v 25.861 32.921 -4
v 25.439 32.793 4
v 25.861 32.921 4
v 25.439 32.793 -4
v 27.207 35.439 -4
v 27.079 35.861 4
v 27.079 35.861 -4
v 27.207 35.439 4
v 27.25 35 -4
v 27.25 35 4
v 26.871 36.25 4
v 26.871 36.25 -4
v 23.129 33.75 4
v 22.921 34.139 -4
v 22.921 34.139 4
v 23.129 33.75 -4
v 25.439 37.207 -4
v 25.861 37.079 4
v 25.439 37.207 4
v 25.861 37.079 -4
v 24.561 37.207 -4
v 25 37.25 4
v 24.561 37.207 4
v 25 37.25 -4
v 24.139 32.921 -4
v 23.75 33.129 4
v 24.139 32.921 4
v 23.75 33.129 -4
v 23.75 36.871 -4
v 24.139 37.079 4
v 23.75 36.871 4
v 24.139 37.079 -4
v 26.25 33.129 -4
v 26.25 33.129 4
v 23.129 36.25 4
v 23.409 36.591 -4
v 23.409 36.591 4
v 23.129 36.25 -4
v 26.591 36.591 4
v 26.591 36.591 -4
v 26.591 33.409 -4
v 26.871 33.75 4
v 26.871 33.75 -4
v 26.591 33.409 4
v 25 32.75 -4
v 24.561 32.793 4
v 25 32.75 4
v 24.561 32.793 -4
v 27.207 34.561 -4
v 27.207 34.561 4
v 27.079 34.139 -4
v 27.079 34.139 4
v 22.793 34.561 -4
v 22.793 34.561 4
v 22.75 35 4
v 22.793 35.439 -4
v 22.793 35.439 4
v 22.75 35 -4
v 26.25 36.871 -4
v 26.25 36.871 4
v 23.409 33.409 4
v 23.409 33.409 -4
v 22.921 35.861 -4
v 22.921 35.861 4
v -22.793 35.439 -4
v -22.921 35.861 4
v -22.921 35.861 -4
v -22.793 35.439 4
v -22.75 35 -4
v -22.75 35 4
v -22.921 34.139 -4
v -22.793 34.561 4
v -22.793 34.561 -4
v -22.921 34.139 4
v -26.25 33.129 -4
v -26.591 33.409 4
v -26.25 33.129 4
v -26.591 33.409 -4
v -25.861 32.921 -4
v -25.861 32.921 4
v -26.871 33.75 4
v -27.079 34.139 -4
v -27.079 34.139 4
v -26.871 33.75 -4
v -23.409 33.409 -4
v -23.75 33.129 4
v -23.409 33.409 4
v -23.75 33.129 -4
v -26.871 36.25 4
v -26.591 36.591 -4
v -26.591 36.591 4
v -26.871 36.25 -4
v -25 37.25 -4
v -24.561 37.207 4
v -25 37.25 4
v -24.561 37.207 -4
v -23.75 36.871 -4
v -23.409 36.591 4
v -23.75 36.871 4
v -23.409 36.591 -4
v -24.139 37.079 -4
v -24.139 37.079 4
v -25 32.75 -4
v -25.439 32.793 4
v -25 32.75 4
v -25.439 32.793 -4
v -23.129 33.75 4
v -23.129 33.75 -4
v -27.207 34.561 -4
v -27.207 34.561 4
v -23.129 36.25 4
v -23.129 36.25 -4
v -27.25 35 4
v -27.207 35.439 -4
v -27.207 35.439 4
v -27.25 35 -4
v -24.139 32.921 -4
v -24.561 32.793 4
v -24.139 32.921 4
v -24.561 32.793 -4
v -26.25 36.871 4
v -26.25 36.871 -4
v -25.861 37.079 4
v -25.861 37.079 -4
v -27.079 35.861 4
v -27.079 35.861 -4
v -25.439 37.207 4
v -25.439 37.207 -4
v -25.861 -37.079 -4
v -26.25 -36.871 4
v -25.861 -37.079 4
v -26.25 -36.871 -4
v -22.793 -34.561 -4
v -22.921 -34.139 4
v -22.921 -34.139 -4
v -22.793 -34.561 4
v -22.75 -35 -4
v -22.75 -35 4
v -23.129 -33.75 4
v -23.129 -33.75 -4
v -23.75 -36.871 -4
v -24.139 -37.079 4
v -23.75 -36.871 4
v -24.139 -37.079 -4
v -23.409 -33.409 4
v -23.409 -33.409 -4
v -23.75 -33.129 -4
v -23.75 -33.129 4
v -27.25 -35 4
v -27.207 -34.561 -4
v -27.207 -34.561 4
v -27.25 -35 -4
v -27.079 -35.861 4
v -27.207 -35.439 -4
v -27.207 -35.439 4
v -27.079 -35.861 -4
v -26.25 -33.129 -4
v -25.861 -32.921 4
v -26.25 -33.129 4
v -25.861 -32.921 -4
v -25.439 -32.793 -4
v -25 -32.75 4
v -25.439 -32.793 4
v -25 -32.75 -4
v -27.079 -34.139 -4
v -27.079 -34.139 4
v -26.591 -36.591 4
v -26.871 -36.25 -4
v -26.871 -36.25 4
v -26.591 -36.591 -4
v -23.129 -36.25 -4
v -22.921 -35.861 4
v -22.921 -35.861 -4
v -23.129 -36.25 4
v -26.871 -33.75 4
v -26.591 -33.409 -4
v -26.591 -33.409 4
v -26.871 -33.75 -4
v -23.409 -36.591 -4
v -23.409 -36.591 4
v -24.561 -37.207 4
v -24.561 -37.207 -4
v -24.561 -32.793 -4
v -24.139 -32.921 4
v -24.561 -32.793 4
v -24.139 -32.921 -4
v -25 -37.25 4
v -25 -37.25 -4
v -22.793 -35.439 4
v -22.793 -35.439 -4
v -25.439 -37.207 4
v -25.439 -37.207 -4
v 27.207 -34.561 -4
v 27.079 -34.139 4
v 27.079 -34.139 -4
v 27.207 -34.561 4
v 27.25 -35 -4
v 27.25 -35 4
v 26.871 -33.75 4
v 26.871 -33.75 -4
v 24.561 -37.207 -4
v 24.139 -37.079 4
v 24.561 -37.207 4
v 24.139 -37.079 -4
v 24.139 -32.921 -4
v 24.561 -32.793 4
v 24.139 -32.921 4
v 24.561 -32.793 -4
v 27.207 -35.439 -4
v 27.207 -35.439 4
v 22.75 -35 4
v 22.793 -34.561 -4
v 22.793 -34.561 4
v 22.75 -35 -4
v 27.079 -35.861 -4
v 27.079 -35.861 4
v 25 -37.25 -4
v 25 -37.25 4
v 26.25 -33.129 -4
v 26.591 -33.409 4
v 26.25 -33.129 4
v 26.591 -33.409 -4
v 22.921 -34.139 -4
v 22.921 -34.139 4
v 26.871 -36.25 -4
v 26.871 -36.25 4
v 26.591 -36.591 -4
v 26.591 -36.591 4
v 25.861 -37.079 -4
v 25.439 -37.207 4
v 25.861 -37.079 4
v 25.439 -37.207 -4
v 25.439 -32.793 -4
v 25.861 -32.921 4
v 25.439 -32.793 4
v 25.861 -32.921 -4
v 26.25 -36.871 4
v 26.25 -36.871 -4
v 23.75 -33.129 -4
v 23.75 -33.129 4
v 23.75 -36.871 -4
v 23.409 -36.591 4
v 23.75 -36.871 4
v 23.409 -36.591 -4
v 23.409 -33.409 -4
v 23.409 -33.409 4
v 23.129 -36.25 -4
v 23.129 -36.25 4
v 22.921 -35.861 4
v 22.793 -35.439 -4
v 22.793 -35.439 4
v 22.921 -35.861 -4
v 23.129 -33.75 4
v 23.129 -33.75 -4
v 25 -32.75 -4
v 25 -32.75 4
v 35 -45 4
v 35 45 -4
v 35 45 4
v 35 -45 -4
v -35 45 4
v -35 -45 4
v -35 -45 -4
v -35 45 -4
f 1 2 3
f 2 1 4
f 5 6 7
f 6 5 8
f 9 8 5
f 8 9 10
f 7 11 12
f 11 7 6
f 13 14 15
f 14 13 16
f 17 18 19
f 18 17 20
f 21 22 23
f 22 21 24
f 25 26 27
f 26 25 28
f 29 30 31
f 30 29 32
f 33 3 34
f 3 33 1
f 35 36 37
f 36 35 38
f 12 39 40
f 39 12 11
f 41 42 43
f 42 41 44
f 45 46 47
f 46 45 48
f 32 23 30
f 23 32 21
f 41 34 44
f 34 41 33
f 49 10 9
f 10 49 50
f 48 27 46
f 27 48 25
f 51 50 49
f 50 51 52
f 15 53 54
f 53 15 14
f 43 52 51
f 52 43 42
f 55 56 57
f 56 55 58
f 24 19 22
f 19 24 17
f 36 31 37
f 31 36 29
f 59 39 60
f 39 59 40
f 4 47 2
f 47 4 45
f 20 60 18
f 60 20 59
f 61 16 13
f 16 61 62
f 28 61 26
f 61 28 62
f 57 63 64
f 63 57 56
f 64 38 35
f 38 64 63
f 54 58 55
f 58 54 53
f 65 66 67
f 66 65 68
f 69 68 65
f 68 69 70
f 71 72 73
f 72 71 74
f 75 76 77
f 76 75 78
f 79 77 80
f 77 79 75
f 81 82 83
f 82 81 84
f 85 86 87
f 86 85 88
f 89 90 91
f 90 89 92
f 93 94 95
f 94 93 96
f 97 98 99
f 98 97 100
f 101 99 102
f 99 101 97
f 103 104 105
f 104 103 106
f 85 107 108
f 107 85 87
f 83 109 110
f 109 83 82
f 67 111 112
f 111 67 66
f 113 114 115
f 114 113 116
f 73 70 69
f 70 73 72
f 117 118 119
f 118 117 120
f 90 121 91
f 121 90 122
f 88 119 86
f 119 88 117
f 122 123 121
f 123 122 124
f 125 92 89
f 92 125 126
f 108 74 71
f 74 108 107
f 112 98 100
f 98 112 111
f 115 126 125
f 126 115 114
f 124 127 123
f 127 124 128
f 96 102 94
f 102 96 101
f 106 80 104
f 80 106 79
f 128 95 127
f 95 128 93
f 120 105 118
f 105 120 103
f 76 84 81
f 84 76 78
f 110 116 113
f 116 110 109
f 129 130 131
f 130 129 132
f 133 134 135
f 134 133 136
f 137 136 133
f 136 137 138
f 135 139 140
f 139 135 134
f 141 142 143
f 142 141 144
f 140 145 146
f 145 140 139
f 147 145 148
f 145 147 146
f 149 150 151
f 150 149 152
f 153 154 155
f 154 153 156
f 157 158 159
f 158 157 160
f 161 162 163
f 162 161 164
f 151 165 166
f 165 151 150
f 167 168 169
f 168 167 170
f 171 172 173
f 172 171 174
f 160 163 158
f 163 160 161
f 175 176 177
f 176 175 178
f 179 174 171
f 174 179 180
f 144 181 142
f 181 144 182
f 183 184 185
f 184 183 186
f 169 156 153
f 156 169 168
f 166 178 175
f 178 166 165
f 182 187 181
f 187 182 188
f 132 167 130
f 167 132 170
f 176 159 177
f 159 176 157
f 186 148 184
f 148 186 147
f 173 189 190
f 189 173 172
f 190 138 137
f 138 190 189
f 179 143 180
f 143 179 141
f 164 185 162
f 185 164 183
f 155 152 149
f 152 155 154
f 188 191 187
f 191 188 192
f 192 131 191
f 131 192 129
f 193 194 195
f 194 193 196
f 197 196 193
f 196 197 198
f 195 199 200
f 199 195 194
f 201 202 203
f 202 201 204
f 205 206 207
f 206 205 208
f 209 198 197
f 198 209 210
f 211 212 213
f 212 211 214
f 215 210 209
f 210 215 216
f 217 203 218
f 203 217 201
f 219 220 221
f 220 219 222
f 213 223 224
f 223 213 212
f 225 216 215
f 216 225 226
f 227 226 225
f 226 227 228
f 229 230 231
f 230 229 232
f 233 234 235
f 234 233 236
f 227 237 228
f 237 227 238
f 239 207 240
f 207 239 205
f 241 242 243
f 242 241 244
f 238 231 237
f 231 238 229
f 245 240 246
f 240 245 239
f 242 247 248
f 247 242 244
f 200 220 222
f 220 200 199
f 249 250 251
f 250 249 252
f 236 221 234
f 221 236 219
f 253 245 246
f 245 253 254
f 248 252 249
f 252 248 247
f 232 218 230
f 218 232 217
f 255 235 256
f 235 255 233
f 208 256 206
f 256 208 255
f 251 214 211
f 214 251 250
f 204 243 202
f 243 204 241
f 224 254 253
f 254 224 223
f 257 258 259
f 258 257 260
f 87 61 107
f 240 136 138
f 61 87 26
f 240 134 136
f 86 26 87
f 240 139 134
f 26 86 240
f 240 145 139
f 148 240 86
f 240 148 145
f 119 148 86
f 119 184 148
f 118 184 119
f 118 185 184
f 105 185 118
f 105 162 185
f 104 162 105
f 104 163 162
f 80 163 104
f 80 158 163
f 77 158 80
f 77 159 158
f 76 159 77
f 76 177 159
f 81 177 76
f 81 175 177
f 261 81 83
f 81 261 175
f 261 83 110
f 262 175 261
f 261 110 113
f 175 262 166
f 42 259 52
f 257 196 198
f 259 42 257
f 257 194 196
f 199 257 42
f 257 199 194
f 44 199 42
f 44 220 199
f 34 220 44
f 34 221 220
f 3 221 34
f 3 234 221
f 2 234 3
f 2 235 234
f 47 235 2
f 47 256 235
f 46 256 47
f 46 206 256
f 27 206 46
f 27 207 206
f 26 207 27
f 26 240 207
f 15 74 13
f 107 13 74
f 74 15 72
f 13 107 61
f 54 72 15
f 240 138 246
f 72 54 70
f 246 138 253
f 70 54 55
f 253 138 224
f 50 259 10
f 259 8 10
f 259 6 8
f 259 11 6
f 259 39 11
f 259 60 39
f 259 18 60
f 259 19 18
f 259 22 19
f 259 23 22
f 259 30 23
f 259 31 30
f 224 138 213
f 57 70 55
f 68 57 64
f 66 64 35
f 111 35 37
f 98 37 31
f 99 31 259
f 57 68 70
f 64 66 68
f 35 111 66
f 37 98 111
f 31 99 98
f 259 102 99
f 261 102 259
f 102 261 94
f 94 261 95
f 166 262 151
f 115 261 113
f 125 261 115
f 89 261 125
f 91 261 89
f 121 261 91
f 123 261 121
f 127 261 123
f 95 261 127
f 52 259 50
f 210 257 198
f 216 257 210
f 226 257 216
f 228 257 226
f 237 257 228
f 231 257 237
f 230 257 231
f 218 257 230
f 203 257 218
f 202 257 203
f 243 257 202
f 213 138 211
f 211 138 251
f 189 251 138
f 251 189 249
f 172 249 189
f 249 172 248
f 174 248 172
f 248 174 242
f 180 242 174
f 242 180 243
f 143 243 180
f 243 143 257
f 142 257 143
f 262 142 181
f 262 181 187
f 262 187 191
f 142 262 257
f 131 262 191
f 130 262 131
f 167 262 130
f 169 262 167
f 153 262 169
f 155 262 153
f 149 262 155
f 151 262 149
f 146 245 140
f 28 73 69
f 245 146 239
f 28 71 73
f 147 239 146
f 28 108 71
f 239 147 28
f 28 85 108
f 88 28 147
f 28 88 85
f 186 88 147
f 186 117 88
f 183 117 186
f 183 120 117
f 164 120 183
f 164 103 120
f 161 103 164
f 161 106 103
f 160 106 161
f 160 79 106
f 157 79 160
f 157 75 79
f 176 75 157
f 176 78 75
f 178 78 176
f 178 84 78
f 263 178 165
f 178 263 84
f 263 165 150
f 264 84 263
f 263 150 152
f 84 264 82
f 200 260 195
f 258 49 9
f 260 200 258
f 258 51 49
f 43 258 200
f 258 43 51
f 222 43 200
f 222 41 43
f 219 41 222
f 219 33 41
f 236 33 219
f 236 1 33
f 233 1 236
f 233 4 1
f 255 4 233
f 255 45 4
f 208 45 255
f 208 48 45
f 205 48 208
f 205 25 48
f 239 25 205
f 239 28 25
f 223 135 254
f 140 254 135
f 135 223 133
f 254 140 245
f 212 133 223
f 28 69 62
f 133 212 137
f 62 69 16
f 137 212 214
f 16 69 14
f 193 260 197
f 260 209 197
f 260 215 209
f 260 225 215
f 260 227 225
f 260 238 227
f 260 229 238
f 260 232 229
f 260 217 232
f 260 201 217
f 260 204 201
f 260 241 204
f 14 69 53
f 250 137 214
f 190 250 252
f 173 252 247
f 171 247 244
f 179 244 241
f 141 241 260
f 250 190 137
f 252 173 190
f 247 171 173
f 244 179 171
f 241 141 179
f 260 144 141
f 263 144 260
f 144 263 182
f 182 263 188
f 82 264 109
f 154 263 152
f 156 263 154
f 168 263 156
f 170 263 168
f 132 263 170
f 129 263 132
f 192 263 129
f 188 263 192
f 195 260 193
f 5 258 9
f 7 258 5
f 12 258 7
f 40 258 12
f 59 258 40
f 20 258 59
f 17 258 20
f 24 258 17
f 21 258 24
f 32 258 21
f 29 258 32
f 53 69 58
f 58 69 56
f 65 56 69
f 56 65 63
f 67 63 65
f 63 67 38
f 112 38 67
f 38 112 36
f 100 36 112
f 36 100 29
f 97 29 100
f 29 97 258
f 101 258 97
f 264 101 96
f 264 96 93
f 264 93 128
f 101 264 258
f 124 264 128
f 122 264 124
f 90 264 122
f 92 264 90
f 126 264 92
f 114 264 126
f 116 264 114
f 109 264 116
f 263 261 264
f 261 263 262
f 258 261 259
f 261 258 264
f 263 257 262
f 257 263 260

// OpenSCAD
$fn = 32;

// ----------------------------------------------------------------------
// Corner plate 70 x 90 x 8
// 4 holes, centres taken from the edge offset
// ----------------------------------------------------------------------

// --- parameters (mm) ---
plate = [70, 90, 8];  // overall size (x, y, z)
holes = 4;            // number of holes the drawing asks for
hole_d = 4.5;         // hole diameter
edge = 10;            // hole centre offset from the plate edge

// --- derived feature positions (mm) ---
corner_x = plate[0] / 2 - edge;  // = 25   corner hole X
corner_y = plate[1] / 2 - edge;  // = 35   corner hole Y
feature_centers = [
  [corner_x, corner_y],
  [-corner_x, corner_y],
  [-corner_x, -corner_y],
  [corner_x, -corner_y]
];   // hole centres the loop below drills

// plate outline, every hole drilled through with the same cutters
difference() {
  cube(plate, center = true);
  for (centre = feature_centers)
    translate([centre[0], centre[1], 0])
      cylinder(d = hole_d, h = plate[2] + 2, center = true);
}
